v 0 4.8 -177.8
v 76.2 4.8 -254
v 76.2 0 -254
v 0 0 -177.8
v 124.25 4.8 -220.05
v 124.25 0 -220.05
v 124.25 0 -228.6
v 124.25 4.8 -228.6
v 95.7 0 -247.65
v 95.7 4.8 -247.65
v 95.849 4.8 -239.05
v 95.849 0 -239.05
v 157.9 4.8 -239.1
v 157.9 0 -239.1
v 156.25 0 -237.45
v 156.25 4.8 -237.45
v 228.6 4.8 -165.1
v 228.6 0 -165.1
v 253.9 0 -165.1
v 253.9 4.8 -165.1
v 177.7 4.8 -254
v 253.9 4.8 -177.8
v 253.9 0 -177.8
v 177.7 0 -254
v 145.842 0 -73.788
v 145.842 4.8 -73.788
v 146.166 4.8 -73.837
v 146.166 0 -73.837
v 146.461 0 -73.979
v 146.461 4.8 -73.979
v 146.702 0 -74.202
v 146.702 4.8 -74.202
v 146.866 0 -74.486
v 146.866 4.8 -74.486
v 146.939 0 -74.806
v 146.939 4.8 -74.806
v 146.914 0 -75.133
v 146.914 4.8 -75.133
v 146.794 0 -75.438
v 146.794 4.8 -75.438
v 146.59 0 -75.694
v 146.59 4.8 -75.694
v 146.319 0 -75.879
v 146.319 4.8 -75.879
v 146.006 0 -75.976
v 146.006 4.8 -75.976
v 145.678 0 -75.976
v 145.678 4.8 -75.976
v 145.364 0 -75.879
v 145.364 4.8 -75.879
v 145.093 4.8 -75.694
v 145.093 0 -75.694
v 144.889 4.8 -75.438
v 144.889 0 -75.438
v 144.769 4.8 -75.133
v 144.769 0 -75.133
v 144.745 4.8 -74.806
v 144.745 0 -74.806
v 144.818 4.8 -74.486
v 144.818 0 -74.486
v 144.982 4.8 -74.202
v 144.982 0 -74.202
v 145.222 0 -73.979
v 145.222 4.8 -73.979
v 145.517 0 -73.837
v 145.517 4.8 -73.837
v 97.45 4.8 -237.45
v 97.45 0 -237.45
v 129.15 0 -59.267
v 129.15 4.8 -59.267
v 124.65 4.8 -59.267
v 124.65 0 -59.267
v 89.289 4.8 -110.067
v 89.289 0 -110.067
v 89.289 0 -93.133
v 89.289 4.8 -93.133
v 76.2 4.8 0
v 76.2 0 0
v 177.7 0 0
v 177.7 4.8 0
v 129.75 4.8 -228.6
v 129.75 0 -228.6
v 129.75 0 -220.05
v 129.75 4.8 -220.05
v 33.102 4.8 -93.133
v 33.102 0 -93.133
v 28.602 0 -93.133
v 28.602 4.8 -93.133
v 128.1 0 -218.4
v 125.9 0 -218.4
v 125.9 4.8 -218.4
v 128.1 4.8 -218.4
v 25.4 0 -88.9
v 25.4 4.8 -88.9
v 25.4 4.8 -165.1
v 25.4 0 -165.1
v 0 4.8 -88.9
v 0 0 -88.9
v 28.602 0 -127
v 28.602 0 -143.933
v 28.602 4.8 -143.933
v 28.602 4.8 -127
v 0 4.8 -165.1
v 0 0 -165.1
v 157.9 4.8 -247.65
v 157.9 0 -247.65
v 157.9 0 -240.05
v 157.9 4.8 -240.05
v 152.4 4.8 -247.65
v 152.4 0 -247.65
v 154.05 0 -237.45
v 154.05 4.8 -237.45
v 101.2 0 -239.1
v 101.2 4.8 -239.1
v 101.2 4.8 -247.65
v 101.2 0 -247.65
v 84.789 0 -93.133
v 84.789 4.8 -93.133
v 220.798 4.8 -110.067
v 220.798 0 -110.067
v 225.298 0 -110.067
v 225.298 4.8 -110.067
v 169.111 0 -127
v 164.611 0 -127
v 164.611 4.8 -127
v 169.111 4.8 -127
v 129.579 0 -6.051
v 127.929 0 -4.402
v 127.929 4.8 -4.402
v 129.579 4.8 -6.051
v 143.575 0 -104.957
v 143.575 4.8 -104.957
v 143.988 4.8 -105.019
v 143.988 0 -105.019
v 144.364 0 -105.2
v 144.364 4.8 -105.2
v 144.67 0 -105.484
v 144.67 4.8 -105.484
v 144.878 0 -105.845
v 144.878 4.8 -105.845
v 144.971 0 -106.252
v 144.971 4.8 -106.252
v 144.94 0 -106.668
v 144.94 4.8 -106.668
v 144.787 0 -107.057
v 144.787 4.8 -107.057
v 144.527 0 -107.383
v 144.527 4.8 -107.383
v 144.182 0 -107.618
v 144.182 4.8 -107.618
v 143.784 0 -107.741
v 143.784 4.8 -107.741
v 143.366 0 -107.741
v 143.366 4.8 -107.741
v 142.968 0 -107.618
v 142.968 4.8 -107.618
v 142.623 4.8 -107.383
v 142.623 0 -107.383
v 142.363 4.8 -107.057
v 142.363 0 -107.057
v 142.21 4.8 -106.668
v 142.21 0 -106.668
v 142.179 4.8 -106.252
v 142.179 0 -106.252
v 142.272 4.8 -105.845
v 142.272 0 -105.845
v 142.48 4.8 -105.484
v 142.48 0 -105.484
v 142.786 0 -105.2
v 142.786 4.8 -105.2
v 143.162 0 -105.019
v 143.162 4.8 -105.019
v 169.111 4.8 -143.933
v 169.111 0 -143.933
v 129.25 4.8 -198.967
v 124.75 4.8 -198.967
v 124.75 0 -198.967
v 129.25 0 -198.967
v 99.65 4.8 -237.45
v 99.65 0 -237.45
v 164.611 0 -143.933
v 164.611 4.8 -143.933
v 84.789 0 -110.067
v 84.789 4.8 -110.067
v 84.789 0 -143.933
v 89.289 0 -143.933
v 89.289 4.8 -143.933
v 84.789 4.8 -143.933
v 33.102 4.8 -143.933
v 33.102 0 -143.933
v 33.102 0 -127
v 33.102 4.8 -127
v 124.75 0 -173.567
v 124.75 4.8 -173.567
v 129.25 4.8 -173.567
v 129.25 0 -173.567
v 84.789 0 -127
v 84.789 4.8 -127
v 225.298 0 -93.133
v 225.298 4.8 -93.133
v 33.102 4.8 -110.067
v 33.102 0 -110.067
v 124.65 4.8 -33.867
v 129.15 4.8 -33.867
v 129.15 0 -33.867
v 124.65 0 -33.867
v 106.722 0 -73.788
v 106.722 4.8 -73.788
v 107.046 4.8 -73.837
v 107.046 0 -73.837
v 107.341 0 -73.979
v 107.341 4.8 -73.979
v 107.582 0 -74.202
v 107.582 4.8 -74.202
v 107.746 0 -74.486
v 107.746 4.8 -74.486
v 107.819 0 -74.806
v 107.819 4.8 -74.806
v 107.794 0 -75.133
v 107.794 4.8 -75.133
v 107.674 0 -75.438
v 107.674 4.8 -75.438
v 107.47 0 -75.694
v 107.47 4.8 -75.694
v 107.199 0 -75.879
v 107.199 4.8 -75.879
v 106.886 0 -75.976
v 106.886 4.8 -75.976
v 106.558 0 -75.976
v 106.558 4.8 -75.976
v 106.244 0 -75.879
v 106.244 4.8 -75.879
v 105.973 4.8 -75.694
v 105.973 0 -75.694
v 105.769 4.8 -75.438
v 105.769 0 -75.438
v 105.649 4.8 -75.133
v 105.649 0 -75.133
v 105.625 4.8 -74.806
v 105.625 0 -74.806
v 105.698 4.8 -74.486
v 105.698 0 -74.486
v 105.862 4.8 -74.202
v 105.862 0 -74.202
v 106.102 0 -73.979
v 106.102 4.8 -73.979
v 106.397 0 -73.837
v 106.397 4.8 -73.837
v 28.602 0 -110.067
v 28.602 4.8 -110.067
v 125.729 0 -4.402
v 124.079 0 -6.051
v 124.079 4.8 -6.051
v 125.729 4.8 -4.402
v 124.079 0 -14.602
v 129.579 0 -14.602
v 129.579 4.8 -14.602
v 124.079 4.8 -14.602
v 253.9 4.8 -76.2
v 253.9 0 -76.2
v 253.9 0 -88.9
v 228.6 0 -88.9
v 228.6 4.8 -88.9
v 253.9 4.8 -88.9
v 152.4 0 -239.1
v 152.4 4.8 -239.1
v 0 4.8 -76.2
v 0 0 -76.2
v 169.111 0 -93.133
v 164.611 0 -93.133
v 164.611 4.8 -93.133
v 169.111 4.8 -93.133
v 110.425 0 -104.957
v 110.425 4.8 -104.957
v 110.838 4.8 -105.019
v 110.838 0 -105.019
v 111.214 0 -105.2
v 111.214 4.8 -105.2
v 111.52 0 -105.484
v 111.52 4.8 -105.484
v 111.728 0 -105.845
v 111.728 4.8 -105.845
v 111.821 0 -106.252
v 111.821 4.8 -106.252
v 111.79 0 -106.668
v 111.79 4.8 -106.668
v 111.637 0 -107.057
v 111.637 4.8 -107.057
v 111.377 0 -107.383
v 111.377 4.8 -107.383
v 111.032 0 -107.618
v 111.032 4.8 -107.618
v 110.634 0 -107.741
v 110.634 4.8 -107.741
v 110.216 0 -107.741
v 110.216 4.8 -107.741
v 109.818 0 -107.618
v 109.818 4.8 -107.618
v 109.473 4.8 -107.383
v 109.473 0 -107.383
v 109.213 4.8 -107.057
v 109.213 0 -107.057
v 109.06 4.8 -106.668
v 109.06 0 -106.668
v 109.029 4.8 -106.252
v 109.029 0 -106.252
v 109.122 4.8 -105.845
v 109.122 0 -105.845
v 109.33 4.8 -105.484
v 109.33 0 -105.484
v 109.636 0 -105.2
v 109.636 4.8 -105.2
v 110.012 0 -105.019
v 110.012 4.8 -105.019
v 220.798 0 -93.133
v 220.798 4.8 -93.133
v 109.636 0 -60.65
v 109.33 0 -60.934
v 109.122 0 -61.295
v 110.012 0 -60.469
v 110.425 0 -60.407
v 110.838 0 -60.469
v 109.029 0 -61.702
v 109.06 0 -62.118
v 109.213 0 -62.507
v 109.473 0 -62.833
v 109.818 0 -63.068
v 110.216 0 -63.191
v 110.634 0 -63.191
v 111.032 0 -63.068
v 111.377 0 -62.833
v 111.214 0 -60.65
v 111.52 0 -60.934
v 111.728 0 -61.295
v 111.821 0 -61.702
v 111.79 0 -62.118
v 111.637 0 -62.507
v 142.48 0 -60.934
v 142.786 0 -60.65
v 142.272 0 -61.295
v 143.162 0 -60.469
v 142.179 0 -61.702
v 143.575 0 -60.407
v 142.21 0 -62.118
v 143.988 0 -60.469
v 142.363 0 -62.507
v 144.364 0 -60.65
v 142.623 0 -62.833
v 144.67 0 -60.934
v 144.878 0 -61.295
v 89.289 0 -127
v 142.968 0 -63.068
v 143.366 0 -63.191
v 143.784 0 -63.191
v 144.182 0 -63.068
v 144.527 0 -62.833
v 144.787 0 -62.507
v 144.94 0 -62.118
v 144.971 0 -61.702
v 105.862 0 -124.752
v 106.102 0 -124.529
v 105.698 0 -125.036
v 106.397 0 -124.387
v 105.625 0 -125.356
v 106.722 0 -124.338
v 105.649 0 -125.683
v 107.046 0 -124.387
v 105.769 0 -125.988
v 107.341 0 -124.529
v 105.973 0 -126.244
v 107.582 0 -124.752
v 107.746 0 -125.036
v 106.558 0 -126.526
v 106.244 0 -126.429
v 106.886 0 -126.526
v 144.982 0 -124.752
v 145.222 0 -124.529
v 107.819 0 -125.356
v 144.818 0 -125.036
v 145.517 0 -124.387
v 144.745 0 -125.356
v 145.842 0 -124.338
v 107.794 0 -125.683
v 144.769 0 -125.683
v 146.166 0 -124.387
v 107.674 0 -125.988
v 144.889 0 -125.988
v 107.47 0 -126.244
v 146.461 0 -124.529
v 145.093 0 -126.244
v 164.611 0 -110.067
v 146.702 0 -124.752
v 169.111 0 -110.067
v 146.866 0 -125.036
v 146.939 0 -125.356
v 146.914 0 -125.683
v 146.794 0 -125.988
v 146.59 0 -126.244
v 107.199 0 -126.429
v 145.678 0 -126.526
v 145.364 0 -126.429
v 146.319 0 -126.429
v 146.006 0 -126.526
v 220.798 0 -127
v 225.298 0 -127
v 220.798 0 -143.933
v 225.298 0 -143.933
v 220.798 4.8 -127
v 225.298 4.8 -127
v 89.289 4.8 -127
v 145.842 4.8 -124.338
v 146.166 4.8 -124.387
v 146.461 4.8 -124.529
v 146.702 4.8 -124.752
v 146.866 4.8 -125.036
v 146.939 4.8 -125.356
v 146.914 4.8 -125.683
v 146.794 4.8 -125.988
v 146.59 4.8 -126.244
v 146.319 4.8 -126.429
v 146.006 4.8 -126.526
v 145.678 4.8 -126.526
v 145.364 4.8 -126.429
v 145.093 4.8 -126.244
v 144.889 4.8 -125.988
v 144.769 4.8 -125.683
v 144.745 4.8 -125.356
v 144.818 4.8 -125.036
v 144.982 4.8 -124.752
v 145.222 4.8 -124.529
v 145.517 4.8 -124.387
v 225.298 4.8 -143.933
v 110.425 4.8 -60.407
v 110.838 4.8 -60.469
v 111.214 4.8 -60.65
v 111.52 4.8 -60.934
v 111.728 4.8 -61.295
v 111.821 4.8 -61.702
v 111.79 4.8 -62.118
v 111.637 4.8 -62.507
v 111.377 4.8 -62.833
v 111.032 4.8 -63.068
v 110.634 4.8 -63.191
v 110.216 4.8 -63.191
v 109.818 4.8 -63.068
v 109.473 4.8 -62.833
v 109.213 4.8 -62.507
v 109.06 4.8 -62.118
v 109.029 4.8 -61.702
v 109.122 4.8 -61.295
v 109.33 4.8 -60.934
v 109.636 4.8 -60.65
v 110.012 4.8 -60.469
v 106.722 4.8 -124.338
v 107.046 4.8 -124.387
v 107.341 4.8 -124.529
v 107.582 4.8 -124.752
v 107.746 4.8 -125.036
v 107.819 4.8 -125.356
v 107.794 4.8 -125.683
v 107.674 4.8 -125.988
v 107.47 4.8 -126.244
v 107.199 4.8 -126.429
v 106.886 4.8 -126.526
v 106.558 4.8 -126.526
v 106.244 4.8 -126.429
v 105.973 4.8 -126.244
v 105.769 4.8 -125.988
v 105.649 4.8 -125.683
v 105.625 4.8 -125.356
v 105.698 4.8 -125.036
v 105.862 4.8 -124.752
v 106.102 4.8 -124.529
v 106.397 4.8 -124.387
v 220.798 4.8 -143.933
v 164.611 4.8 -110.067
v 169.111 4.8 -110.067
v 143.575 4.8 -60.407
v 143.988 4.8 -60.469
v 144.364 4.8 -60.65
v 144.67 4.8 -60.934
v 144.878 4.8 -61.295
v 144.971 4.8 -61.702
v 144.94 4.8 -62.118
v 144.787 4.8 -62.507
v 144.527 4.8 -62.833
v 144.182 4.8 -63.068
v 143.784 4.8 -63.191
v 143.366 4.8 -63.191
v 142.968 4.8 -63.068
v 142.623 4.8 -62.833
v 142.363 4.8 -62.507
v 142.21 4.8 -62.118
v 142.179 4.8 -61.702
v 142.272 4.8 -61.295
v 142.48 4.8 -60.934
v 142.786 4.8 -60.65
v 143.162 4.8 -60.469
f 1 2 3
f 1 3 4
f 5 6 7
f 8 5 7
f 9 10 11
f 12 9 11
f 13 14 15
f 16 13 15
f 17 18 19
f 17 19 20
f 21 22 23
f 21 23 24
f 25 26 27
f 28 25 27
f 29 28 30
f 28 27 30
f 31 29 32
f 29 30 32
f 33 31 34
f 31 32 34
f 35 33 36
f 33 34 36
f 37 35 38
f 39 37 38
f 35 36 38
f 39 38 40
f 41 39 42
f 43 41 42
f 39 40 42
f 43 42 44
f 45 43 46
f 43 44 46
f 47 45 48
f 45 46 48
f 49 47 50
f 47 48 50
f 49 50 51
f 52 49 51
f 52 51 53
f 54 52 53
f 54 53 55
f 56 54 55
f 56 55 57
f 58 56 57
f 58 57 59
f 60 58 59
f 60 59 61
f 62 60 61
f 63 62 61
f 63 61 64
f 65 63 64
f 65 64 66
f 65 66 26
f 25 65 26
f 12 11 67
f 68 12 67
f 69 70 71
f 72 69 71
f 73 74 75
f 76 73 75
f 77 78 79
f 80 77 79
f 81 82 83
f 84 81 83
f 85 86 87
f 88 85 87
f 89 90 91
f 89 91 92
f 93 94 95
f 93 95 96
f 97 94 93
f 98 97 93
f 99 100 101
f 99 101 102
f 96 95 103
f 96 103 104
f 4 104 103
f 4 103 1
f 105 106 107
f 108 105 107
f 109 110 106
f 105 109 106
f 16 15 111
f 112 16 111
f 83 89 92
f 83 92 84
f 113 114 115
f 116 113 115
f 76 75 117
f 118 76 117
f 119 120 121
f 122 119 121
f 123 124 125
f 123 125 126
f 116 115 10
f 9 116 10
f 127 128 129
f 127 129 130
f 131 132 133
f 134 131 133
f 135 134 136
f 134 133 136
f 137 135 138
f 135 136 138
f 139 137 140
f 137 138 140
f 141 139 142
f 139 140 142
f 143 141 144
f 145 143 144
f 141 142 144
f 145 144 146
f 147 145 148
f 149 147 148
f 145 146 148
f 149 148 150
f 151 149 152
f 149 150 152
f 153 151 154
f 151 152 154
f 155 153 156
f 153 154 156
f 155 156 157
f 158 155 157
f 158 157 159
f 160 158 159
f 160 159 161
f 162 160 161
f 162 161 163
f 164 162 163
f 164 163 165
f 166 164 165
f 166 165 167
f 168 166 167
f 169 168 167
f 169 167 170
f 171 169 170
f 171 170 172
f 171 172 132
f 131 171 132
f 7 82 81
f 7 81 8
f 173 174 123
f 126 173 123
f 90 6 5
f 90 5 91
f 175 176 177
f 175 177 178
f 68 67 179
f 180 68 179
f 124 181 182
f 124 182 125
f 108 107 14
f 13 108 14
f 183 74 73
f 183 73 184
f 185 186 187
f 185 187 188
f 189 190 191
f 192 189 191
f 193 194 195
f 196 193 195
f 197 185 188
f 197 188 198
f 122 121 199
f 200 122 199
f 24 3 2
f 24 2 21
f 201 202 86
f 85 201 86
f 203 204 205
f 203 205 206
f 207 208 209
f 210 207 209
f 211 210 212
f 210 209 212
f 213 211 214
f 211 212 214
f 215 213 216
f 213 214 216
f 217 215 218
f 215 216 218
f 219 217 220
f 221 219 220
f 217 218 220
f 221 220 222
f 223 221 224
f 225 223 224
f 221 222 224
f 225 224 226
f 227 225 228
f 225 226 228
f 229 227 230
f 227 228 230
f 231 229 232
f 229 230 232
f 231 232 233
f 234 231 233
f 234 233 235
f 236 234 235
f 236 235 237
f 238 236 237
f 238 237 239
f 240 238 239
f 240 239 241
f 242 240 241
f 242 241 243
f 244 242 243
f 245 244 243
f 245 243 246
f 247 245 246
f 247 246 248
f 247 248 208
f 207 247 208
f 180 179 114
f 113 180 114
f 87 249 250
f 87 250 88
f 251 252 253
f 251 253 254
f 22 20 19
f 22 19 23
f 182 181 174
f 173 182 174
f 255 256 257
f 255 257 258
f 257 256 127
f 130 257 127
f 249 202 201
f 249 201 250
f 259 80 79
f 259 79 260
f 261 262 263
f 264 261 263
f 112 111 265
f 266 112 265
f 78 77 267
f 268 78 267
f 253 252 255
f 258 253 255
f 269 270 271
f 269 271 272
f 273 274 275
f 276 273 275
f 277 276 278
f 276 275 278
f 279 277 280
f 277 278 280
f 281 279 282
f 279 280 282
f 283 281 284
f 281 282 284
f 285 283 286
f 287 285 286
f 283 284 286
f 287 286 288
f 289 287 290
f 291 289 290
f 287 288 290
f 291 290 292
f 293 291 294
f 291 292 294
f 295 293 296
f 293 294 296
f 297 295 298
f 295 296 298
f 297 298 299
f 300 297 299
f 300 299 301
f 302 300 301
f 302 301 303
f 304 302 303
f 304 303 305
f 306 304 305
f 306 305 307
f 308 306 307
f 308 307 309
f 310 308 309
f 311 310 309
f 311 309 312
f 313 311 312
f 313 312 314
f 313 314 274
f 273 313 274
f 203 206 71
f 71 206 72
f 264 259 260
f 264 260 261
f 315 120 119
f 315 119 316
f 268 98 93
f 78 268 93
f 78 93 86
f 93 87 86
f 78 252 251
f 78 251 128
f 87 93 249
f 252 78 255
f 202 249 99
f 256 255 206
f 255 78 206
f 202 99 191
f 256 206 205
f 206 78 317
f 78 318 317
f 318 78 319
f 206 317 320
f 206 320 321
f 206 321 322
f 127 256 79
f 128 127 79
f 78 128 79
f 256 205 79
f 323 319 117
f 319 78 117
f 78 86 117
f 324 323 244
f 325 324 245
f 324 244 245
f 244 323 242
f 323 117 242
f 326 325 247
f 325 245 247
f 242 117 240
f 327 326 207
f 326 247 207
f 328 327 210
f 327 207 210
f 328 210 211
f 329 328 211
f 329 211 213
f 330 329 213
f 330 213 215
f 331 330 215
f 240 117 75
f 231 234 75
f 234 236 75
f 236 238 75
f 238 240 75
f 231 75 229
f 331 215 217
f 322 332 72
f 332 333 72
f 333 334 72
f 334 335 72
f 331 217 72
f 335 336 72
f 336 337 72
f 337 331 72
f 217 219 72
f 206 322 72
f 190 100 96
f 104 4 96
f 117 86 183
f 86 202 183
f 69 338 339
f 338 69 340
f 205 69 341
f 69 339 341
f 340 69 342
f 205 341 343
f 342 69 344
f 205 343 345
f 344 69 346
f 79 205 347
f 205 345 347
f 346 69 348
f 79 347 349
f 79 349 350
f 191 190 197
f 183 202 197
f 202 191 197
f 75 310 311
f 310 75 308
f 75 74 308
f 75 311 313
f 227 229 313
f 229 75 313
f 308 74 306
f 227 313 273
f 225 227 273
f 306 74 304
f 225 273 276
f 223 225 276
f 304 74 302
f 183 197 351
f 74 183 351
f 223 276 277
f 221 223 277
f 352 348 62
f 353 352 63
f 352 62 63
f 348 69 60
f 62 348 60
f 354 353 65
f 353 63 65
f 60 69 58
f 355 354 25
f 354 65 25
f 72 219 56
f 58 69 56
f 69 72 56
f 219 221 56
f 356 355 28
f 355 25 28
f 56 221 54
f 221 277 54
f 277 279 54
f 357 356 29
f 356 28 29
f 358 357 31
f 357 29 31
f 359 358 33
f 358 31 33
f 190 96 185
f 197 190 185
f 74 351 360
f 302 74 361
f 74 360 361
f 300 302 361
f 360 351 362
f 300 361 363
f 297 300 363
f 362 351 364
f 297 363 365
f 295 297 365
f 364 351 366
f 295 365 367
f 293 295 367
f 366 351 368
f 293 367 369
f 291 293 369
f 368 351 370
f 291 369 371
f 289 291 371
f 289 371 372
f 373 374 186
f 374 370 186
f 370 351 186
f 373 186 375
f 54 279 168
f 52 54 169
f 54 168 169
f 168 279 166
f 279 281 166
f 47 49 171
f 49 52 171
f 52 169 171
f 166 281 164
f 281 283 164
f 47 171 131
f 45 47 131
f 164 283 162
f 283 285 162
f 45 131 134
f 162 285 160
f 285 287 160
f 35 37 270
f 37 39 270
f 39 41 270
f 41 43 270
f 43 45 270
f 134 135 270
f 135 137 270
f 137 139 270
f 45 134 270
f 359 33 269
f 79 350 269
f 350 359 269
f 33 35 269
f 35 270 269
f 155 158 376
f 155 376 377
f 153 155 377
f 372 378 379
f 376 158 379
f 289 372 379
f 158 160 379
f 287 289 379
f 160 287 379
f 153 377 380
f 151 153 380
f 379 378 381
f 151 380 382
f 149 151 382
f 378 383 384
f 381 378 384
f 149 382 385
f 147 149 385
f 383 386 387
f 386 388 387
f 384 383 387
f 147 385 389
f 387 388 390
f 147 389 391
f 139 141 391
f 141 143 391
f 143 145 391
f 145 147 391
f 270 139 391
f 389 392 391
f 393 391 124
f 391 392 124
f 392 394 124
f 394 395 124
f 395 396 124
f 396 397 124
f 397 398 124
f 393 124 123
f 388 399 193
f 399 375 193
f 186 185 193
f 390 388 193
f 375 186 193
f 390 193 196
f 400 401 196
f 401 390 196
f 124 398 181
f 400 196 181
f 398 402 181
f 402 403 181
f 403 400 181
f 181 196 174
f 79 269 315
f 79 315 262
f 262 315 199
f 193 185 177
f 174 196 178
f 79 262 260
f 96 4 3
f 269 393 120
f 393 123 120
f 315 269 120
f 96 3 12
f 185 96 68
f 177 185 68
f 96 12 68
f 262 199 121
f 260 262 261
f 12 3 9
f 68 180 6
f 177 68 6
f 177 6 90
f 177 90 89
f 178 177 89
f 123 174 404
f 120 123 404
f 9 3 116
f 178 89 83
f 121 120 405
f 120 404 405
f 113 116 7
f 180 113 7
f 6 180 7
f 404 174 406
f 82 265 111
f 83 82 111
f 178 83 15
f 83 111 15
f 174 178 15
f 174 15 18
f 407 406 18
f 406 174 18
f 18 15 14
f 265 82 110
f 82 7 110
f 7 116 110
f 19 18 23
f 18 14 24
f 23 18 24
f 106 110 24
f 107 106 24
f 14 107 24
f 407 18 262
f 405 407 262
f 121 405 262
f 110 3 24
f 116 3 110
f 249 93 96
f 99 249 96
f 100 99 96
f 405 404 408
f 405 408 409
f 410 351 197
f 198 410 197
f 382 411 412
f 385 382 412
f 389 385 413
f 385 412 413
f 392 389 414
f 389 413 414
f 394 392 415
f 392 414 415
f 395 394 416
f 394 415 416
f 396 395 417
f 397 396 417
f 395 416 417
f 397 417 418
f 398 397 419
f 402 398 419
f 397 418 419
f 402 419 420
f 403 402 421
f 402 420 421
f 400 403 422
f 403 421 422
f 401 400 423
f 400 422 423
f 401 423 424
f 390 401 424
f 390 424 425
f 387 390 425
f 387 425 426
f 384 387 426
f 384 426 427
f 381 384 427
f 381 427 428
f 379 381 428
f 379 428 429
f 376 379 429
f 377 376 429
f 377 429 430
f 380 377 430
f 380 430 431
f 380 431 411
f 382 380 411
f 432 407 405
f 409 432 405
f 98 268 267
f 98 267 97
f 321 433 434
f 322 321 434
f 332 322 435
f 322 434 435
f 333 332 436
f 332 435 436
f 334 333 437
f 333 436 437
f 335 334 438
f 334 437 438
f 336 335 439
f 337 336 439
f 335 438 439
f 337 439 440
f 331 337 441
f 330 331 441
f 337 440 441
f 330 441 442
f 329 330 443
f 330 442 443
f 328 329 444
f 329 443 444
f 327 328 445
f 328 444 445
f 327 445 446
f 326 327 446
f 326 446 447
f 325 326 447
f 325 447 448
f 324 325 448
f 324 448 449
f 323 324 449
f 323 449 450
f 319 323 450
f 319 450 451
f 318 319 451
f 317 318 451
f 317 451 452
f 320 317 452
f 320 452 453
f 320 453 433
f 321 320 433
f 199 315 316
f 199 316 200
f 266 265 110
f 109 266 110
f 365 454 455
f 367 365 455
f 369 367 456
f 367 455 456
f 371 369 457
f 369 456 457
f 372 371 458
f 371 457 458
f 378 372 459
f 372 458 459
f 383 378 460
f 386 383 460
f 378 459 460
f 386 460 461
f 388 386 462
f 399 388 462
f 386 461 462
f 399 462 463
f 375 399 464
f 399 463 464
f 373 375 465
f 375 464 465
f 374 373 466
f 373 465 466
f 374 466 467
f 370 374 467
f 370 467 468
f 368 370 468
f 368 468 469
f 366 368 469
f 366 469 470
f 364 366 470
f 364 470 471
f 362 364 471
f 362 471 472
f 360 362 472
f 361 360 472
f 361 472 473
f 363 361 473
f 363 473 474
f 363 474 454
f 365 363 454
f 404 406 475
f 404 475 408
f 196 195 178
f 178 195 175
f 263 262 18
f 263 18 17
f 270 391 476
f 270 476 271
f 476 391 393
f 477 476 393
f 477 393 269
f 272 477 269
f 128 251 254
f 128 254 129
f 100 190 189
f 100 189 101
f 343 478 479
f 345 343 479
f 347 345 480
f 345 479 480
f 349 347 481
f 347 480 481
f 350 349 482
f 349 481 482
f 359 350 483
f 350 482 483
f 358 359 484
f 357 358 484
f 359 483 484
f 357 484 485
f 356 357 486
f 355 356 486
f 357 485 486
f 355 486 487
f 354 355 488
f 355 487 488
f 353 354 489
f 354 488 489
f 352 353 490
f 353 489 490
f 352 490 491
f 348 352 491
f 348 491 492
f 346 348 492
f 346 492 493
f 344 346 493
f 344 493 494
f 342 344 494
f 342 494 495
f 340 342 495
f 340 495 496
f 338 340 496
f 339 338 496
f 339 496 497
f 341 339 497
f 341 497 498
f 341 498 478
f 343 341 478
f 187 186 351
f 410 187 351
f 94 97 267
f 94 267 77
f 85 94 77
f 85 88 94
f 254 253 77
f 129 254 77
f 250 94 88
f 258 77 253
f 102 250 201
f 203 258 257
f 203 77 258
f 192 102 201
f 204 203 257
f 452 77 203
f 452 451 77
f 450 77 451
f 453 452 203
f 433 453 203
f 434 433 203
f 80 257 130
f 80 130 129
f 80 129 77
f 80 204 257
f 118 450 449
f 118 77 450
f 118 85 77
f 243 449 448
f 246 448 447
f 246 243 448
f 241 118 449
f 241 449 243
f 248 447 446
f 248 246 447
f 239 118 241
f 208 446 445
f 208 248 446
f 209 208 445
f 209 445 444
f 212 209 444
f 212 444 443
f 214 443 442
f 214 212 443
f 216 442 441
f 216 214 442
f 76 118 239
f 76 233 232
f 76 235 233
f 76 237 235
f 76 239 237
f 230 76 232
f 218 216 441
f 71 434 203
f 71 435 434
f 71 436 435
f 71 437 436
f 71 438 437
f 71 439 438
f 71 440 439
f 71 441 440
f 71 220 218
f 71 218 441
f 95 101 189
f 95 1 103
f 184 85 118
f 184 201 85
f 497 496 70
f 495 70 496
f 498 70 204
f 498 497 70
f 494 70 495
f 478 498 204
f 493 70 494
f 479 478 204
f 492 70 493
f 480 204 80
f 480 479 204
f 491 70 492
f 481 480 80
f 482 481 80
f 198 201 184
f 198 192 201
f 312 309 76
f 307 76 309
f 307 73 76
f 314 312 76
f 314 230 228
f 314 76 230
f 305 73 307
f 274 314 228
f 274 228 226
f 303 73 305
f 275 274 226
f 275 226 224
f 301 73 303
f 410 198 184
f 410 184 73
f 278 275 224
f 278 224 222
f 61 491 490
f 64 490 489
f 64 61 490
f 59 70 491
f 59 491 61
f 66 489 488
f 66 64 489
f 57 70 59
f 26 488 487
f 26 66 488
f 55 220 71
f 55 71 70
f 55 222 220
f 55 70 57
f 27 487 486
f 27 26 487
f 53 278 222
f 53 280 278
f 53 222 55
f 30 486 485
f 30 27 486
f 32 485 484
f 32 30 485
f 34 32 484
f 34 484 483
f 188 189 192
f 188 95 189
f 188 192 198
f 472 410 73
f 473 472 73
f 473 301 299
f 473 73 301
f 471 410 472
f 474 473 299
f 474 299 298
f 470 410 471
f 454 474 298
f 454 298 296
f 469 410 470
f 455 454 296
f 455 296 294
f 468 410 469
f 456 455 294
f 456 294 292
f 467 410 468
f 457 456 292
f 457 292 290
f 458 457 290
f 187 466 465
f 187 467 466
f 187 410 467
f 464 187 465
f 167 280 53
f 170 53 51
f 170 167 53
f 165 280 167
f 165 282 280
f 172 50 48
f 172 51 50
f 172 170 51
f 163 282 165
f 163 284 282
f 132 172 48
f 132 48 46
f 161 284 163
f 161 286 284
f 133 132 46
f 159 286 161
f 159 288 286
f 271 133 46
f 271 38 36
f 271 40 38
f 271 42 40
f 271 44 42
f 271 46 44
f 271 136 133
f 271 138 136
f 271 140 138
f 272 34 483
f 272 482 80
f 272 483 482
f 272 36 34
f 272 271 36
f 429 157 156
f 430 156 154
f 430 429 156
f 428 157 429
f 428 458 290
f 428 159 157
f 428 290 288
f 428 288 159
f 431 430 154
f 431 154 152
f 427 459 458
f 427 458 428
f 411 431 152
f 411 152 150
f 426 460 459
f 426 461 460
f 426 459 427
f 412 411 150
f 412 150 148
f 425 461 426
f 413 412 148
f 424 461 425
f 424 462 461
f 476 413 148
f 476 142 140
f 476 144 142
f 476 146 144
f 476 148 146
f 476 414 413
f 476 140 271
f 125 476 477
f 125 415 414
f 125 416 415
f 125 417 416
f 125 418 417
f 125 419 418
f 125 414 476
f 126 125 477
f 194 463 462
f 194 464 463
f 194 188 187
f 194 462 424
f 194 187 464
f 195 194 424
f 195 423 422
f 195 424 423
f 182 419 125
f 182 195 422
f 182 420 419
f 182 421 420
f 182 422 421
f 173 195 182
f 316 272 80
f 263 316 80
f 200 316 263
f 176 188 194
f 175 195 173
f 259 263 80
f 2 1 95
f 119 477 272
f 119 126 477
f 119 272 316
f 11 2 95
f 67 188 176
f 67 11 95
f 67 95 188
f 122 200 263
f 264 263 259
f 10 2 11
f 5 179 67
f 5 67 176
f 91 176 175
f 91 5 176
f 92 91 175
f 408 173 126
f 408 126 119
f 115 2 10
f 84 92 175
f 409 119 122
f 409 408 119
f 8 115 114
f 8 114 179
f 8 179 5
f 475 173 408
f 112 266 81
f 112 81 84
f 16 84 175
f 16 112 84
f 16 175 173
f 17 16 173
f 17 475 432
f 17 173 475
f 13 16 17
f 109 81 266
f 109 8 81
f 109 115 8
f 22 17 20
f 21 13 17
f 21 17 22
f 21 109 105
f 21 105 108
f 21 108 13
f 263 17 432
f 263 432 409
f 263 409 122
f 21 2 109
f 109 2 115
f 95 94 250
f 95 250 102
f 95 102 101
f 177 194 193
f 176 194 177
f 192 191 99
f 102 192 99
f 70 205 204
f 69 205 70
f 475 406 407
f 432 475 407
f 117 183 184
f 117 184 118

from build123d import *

# Parameters (mm, degrees)
SKETCH1_W            = 254
SKETCH1_H            = 254
BOSS_EXTRUDE1_DEPTH  = 4.800000052
CUT_EXTRUDE2_DEPTH   = 360.242313767
CUT_EXTRUDE3_DEPTH   = 4.826
CUT_EXTRUDE5_DEPTH   = 4.826
CUT_EXTRUDE6_DEPTH   = 4.826
SKETCH16_OUTSIDE_W   = 327.848
SKETCH16_OUTSIDE_H   = 327.848
CUT_EXTRUDE8_DEPTH   = 360.242313767
SKETCH17_OUTSIDE_W   = 327.848
SKETCH17_OUTSIDE_H   = 327.848
CUT_EXTRUDE17_DEPTH  = 360.242313767
SKETCH18_OUTSIDE_W   = 327.848
SKETCH18_OUTSIDE_H   = 327.848
CUT_EXTRUDE18_DEPTH  = 216.155906991
SKETCH19_OUTSIDE_W   = 327.734
SKETCH19_OUTSIDE_H   = 327.834
SKETCH19_OUTSIDE_W_2 = 4.500000144
SKETCH19_OUTSIDE_H_2 = 16.933333333
CUT_EXTRUDE19_DEPTH  = 364.309275828
SKETCH32_W           = 4.800000052
SKETCH32_H           = 76.2
CUT_EXTRUDE22_DEPTH  = 25.4
CUT_EXTRUDE23_DEPTH  = 216.155906991
SKETCH34_W           = 4.800000052
SKETCH34_H           = 76.2
CUT_EXTRUDE24_DEPTH  = 25.4
SKETCH36_W           = 4.500000144
SKETCH36_H           = 16.933333333
CUT_EXTRUDE26_DEPTH  = 364.309275828
SKETCH37_W           = 4.500000144
SKETCH37_H           = 25.4
CUT_EXTRUDE27_DEPTH  = 360.171616324
SKETCH48_W           = 4.500000144
SKETCH48_H           = 25.4
CUT_EXTRUDE34_DEPTH  = 360.171616324
SKETCH50_R           = 1.4
CUT_EXTRUDE35_DEPTH  = 506.24041807
SKETCH51_R           = 1.1
CUT_EXTRUDE36_DEPTH  = 1021.904407936


with BuildPart() as part:
    # Sketch1 → Boss-Extrude1 (new body)
    with BuildSketch(Plane(origin=(0, 0, 0), x_dir=(1, 0, 0), z_dir=(0, 1, 0))):
        with Locations((127, 127)):
            Rectangle(SKETCH1_W, SKETCH1_H)
    extrude(amount=BOSS_EXTRUDE1_DEPTH)

    # Sketch4 → Cut-Extrude2 (cut, through all)
    with BuildSketch(Plane(origin=(0, 4.800000052, 0), x_dir=(1, 0, 0), z_dir=(0, 1, 0))):
        Polygon((76.2, 254), (0, 177.8), (0, 254), align=None)
    extrude(amount=-CUT_EXTRUDE2_DEPTH, mode=Mode.SUBTRACT)

    # Sketch5 → Cut-Extrude3 (cut)
    with BuildSketch(Plane(origin=(0, 4.800000052, 0), x_dir=(1, 0, 0), z_dir=(0, 1, 0))):
        Polygon((177.8, 254), (254, 177.8), (254, 254), align=None)
    extrude(amount=-CUT_EXTRUDE3_DEPTH, mode=Mode.SUBTRACT)

    # Sketch9 → Cut-Extrude5 (cut)
    with BuildSketch(Plane(origin=(0, 4.800000052, 0), x_dir=(1, 0, 0), z_dir=(0, 1, 0))):
        Polygon((0, 76.2), (0, 0), (76.2, 0), align=None)
    extrude(amount=-CUT_EXTRUDE5_DEPTH, mode=Mode.SUBTRACT)

    # Sketch11 → Cut-Extrude6 (cut)
    with BuildSketch(Plane(origin=(0, 4.800000052, 0), x_dir=(1, 0, 0), z_dir=(0, 1, 0))):
        Polygon((254, 76.2), (254, 0), (177.8, 0), align=None)
    extrude(amount=-CUT_EXTRUDE6_DEPTH, mode=Mode.SUBTRACT)

    # Sketch16 outside → Cut-Extrude8 (cut, through all)
    # profile 1 of 2: a face of its own
    with BuildSketch(Plane.XZ):
        with Locations((127, -127)):
            Rectangle(SKETCH16_OUTSIDE_W, SKETCH16_OUTSIDE_H)
        Polygon((254, -76.2), (177.8, 0), (76.2, 0), (0, -76.2), (0, -177.8), (76.2, -254), (177.8, -254), (254, -177.8), align=None, mode=Mode.SUBTRACT)
    # profile 2 of 2: a face of its own
    with BuildSketch(Plane.XZ):
        Polygon((154.05, -237.45), (152.4, -239.09956871), (152.4, -247.65), (157.899988492, -247.65), (157.899988492, -247.233680101), (157.899988492, -246.283680101), (157.899988492, -243.349999982), (157.899988492, -243.025), (157.899988492, -242.075), (157.899988492, -241.750000018), (157.899988492, -240.049999963), (157.899991793, -239.09957201), (156.249995092, -237.45), align=None)
    extrude(amount=-CUT_EXTRUDE8_DEPTH, mode=Mode.SUBTRACT)

    # Sketch17 outside → Cut-Extrude17 (cut, through all)
    # profile 1 of 2: a face of its own
    with BuildSketch(Plane.XZ):
        with Locations((127, -127)):
            Rectangle(SKETCH17_OUTSIDE_W, SKETCH17_OUTSIDE_H)
        Polygon((254, -76.2), (177.8, 0), (76.2, 0), (0, -76.2), (0, -177.8), (76.2, -254), (177.8, -254), (254, -177.8), align=None, mode=Mode.SUBTRACT)
    # profile 2 of 2: a face of its own
    with BuildSketch(Plane.XZ):
        Polygon((125.900002454, -218.4), (128.099997546, -218.4), (129.749994246, -220.04956871), (129.749994246, -220.999999963), (129.749994246, -222.700000018), (129.749994246, -223.025), (129.749994246, -223.975), (129.749994246, -224.299999982), (129.749994246, -227.233680101), (129.749994246, -228.183680101), (129.749994246, -228.6), (124.250005754, -228.6), (124.250005754, -228.183680101), (124.250005754, -228.15), (124.250005754, -227.233680101), (124.250005754, -224.299999982), (124.250005754, -223.975), (124.250005754, -223.025), (124.250005754, -222.700000018), (124.250005754, -220.999999963), (124.250005754, -220.04956871), align=None)
    extrude(amount=-CUT_EXTRUDE17_DEPTH, mode=Mode.SUBTRACT)

    # Sketch18 outside → Cut-Extrude18 (cut, through all)
    # profile 1 of 2: a face of its own
    with BuildSketch(Plane(origin=(166.661666982, 4.800000052, -135.988650526), x_dir=(1, 0, 0), z_dir=(0, 1, 0))):
        with Locations((-39.662, -8.989)):
            Rectangle(SKETCH18_OUTSIDE_W, SKETCH18_OUTSIDE_H)
        Polygon((-90.561667036, -135.988650526), (11.038332964, -135.988650526), (87.238332964, -59.788650526), (87.238332964, 41.811349474), (11.038332964, 118.011349474), (-90.561667036, 118.011349474), (-166.761667036, 41.811349474), (-166.761667036, -59.788650526), align=None, mode=Mode.SUBTRACT)
    # profile 2 of 2: a face of its own
    with BuildSketch(Plane(origin=(166.661666982, 4.800000052, -135.988650526), x_dir=(1, 0, 0), z_dir=(0, 1, 0))):
        Polygon((-65.461678544, 103.110918185), (-65.461678544, 111.661349474), (-70.961667036, 111.661349474), (-70.812431754, 103.061695826), (-69.211666982, 101.461349474), (-67.01167189, 101.461349474), align=None)
    extrude(amount=-CUT_EXTRUDE18_DEPTH, mode=Mode.SUBTRACT)

    # Sketch19 outside → Cut-Extrude19 (cut, through all)
    # profile 1 of 3: a face of its own
    with BuildSketch(Plane(origin=(277.632305151, 0, -234.288055689), x_dir=(1, 0, 0), z_dir=(0, -1, 0))):
        with Locations((-150.682, 107.288)):
            Rectangle(SKETCH19_OUTSIDE_W, SKETCH19_OUTSIDE_H)
        Polygon((-23.632305151, 158.088055689), (-99.832305151, 234.288055689), (-201.432305151, 234.288055689), (-277.632305151, 158.088055689), (-277.632305151, 56.488055689), (-201.432305151, -19.711944311), (-99.832305151, -19.711944311), (-23.632305151, 56.488055689), align=None, mode=Mode.SUBTRACT)
    # profile 2 of 3: a face of its own
    with BuildSketch(Plane(origin=(277.632305151, 0, -234.288055689), x_dir=(1, 0, 0), z_dir=(0, -1, 0))):
        with Locations((-54.584305223, 132.68805569)):
            Rectangle(SKETCH19_OUTSIDE_W_2, SKETCH19_OUTSIDE_H_2)
    # profile 3 of 3: a face of its own
    with BuildSketch(Plane(origin=(277.632305151, 0, -234.288055689), x_dir=(1, 0, 0), z_dir=(0, -1, 0))):
        with Locations((-54.584305223, 98.821389023)):
            Rectangle(SKETCH19_OUTSIDE_W_2, SKETCH19_OUTSIDE_H_2)
    cut_extrude19 = extrude(amount=-CUT_EXTRUDE19_DEPTH, mode=Mode.SUBTRACT)

    # Mirror2: Cut-Extrude19 across plane
    add(cut_extrude19.mirror(Plane(origin=(126.949999973, 0, 0), x_dir=(0, 0, 1), z_dir=(1, 0, 0))), mode=Mode.SUBTRACT)

    # Sketch32 → Cut-Extrude22 (cut)
    with BuildSketch(Plane(origin=(254, 6.738807757, -234.288055689), x_dir=(0, 1, 0), z_dir=(1, 0, 0))):
        with Locations((-4.338807731, 107.288055689)):
            Rectangle(SKETCH32_W, SKETCH32_H)
    extrude(amount=-CUT_EXTRUDE22_DEPTH, mode=Mode.SUBTRACT)

    # Sketch33 → Cut-Extrude23 (cut, through all)
    with BuildSketch(Plane(origin=(166.661666982, 0, -135.988650526), x_dir=(1, 0, 0), z_dir=(0, -1, 0))):
        Polygon((-42.582666982, 122.75320968), (-42.582666982, 125.686889799), (-42.582666982, 126.011889781), (-42.582666982, 126.961889781), (-42.582666982, 127.286889763), (-42.582666982, 128.986889819), (-42.582666982, 129.937321071), (-40.932670282, 131.586889781), (-38.73267519, 131.586889781), (-37.08267849, 129.937321071), (-37.08267849, 122.75320968), (-37.08267849, 121.80320968), (-37.08267849, 121.386889781), (-42.582666982, 121.386889781), (-42.582666982, 121.836889781), align=None)
    extrude(amount=-CUT_EXTRUDE23_DEPTH, mode=Mode.SUBTRACT)

    # Sketch34 → Cut-Extrude24 (cut)
    with BuildSketch(Plane(origin=(0, 6.738807757, -234.288055689), x_dir=(0, -1, 0), z_dir=(-1, 0, 0))):
        with Locations((4.338807731, 107.288055689)):
            Rectangle(SKETCH34_W, SKETCH34_H)
    extrude(amount=-CUT_EXTRUDE24_DEPTH, mode=Mode.SUBTRACT)

    # Sketch36 → Cut-Extrude26 (cut, through all)
    with BuildSketch(Plane(origin=(277.632305151, 0, -234.288055689), x_dir=(1, 0, 0), z_dir=(0, -1, 0))):
        with Locations((-110.770919354, 132.68805569)):
            Rectangle(SKETCH36_W, SKETCH36_H)
        with Locations((-110.770883223, 98.821389023)):
            Rectangle(SKETCH36_W, SKETCH36_H)
    cut_extrude26 = extrude(amount=-CUT_EXTRUDE26_DEPTH, mode=Mode.SUBTRACT)

    # Mirror3: Cut-Extrude26 across plane
    add(cut_extrude26.mirror(Plane(origin=(126.949999973, 0, 0), x_dir=(0, 0, 1), z_dir=(1, 0, 0))), mode=Mode.SUBTRACT)

    # Sketch37 → Cut-Extrude27 (cut, through all)
    with BuildSketch(Plane(origin=(0, 4.800000052, 0), x_dir=(1, 0, 0), z_dir=(0, 1, 0))):
        with Locations((127, 186.266666667)):
            Rectangle(SKETCH37_W, SKETCH37_H)
    extrude(amount=-CUT_EXTRUDE27_DEPTH, mode=Mode.SUBTRACT)

    # Sketch48 → Cut-Extrude34 (cut, through all)
    with BuildSketch(Plane(origin=(0, 0, 0), x_dir=(-1, 0, 0), z_dir=(0, -1, 0))):
        with Locations((-126.899999946, 46.566666667)):
            Rectangle(SKETCH48_W, SKETCH48_H)
    extrude(amount=-CUT_EXTRUDE34_DEPTH, mode=Mode.SUBTRACT)

    # Sketch50 → Cut-Extrude35 (cut, through all)
    with BuildSketch(Plane(origin=(0, 4.800000052, -436.783275868), x_dir=(1, 0, 0), z_dir=(0, 1, 0))):
        with Locations(Location((143.575, -330.426609202, 0), (0, 0, 270))):
            Circle(SKETCH50_R)
        with Locations(Location((110.425, -330.426609202, 0), (0, 0, 270))):
            Circle(SKETCH50_R)
        with Locations(Location((143.575, -374.976609202, 0), (0, 0, 270))):
            Circle(SKETCH50_R)
        with Locations(Location((110.425, -374.976609202, 0), (0, 0, 270))):
            Circle(SKETCH50_R)
    extrude(amount=-CUT_EXTRUDE35_DEPTH, mode=Mode.SUBTRACT)

    # Sketch51 → Cut-Extrude36 (cut, through all)
    with BuildSketch(Plane(origin=(0, 4.800000052, -988.816241862), x_dir=(1, 0, 0), z_dir=(0, 1, 0))):
        with Locations(Location((145.841662515, -863.378312681, 0), (0, 0, 270))):
            Circle(SKETCH51_R)
        with Locations(Location((106.721662515, -863.378312681, 0), (0, 0, 270))):
            Circle(SKETCH51_R)
        with Locations(Location((145.841662515, -913.928312681, 0), (0, 0, 270))):
            Circle(SKETCH51_R)
        with Locations(Location((106.721662515, -913.928312681, 0), (0, 0, 270))):
            Circle(SKETCH51_R)
    extrude(amount=-CUT_EXTRUDE36_DEPTH, mode=Mode.SUBTRACT)


solid = part.part
